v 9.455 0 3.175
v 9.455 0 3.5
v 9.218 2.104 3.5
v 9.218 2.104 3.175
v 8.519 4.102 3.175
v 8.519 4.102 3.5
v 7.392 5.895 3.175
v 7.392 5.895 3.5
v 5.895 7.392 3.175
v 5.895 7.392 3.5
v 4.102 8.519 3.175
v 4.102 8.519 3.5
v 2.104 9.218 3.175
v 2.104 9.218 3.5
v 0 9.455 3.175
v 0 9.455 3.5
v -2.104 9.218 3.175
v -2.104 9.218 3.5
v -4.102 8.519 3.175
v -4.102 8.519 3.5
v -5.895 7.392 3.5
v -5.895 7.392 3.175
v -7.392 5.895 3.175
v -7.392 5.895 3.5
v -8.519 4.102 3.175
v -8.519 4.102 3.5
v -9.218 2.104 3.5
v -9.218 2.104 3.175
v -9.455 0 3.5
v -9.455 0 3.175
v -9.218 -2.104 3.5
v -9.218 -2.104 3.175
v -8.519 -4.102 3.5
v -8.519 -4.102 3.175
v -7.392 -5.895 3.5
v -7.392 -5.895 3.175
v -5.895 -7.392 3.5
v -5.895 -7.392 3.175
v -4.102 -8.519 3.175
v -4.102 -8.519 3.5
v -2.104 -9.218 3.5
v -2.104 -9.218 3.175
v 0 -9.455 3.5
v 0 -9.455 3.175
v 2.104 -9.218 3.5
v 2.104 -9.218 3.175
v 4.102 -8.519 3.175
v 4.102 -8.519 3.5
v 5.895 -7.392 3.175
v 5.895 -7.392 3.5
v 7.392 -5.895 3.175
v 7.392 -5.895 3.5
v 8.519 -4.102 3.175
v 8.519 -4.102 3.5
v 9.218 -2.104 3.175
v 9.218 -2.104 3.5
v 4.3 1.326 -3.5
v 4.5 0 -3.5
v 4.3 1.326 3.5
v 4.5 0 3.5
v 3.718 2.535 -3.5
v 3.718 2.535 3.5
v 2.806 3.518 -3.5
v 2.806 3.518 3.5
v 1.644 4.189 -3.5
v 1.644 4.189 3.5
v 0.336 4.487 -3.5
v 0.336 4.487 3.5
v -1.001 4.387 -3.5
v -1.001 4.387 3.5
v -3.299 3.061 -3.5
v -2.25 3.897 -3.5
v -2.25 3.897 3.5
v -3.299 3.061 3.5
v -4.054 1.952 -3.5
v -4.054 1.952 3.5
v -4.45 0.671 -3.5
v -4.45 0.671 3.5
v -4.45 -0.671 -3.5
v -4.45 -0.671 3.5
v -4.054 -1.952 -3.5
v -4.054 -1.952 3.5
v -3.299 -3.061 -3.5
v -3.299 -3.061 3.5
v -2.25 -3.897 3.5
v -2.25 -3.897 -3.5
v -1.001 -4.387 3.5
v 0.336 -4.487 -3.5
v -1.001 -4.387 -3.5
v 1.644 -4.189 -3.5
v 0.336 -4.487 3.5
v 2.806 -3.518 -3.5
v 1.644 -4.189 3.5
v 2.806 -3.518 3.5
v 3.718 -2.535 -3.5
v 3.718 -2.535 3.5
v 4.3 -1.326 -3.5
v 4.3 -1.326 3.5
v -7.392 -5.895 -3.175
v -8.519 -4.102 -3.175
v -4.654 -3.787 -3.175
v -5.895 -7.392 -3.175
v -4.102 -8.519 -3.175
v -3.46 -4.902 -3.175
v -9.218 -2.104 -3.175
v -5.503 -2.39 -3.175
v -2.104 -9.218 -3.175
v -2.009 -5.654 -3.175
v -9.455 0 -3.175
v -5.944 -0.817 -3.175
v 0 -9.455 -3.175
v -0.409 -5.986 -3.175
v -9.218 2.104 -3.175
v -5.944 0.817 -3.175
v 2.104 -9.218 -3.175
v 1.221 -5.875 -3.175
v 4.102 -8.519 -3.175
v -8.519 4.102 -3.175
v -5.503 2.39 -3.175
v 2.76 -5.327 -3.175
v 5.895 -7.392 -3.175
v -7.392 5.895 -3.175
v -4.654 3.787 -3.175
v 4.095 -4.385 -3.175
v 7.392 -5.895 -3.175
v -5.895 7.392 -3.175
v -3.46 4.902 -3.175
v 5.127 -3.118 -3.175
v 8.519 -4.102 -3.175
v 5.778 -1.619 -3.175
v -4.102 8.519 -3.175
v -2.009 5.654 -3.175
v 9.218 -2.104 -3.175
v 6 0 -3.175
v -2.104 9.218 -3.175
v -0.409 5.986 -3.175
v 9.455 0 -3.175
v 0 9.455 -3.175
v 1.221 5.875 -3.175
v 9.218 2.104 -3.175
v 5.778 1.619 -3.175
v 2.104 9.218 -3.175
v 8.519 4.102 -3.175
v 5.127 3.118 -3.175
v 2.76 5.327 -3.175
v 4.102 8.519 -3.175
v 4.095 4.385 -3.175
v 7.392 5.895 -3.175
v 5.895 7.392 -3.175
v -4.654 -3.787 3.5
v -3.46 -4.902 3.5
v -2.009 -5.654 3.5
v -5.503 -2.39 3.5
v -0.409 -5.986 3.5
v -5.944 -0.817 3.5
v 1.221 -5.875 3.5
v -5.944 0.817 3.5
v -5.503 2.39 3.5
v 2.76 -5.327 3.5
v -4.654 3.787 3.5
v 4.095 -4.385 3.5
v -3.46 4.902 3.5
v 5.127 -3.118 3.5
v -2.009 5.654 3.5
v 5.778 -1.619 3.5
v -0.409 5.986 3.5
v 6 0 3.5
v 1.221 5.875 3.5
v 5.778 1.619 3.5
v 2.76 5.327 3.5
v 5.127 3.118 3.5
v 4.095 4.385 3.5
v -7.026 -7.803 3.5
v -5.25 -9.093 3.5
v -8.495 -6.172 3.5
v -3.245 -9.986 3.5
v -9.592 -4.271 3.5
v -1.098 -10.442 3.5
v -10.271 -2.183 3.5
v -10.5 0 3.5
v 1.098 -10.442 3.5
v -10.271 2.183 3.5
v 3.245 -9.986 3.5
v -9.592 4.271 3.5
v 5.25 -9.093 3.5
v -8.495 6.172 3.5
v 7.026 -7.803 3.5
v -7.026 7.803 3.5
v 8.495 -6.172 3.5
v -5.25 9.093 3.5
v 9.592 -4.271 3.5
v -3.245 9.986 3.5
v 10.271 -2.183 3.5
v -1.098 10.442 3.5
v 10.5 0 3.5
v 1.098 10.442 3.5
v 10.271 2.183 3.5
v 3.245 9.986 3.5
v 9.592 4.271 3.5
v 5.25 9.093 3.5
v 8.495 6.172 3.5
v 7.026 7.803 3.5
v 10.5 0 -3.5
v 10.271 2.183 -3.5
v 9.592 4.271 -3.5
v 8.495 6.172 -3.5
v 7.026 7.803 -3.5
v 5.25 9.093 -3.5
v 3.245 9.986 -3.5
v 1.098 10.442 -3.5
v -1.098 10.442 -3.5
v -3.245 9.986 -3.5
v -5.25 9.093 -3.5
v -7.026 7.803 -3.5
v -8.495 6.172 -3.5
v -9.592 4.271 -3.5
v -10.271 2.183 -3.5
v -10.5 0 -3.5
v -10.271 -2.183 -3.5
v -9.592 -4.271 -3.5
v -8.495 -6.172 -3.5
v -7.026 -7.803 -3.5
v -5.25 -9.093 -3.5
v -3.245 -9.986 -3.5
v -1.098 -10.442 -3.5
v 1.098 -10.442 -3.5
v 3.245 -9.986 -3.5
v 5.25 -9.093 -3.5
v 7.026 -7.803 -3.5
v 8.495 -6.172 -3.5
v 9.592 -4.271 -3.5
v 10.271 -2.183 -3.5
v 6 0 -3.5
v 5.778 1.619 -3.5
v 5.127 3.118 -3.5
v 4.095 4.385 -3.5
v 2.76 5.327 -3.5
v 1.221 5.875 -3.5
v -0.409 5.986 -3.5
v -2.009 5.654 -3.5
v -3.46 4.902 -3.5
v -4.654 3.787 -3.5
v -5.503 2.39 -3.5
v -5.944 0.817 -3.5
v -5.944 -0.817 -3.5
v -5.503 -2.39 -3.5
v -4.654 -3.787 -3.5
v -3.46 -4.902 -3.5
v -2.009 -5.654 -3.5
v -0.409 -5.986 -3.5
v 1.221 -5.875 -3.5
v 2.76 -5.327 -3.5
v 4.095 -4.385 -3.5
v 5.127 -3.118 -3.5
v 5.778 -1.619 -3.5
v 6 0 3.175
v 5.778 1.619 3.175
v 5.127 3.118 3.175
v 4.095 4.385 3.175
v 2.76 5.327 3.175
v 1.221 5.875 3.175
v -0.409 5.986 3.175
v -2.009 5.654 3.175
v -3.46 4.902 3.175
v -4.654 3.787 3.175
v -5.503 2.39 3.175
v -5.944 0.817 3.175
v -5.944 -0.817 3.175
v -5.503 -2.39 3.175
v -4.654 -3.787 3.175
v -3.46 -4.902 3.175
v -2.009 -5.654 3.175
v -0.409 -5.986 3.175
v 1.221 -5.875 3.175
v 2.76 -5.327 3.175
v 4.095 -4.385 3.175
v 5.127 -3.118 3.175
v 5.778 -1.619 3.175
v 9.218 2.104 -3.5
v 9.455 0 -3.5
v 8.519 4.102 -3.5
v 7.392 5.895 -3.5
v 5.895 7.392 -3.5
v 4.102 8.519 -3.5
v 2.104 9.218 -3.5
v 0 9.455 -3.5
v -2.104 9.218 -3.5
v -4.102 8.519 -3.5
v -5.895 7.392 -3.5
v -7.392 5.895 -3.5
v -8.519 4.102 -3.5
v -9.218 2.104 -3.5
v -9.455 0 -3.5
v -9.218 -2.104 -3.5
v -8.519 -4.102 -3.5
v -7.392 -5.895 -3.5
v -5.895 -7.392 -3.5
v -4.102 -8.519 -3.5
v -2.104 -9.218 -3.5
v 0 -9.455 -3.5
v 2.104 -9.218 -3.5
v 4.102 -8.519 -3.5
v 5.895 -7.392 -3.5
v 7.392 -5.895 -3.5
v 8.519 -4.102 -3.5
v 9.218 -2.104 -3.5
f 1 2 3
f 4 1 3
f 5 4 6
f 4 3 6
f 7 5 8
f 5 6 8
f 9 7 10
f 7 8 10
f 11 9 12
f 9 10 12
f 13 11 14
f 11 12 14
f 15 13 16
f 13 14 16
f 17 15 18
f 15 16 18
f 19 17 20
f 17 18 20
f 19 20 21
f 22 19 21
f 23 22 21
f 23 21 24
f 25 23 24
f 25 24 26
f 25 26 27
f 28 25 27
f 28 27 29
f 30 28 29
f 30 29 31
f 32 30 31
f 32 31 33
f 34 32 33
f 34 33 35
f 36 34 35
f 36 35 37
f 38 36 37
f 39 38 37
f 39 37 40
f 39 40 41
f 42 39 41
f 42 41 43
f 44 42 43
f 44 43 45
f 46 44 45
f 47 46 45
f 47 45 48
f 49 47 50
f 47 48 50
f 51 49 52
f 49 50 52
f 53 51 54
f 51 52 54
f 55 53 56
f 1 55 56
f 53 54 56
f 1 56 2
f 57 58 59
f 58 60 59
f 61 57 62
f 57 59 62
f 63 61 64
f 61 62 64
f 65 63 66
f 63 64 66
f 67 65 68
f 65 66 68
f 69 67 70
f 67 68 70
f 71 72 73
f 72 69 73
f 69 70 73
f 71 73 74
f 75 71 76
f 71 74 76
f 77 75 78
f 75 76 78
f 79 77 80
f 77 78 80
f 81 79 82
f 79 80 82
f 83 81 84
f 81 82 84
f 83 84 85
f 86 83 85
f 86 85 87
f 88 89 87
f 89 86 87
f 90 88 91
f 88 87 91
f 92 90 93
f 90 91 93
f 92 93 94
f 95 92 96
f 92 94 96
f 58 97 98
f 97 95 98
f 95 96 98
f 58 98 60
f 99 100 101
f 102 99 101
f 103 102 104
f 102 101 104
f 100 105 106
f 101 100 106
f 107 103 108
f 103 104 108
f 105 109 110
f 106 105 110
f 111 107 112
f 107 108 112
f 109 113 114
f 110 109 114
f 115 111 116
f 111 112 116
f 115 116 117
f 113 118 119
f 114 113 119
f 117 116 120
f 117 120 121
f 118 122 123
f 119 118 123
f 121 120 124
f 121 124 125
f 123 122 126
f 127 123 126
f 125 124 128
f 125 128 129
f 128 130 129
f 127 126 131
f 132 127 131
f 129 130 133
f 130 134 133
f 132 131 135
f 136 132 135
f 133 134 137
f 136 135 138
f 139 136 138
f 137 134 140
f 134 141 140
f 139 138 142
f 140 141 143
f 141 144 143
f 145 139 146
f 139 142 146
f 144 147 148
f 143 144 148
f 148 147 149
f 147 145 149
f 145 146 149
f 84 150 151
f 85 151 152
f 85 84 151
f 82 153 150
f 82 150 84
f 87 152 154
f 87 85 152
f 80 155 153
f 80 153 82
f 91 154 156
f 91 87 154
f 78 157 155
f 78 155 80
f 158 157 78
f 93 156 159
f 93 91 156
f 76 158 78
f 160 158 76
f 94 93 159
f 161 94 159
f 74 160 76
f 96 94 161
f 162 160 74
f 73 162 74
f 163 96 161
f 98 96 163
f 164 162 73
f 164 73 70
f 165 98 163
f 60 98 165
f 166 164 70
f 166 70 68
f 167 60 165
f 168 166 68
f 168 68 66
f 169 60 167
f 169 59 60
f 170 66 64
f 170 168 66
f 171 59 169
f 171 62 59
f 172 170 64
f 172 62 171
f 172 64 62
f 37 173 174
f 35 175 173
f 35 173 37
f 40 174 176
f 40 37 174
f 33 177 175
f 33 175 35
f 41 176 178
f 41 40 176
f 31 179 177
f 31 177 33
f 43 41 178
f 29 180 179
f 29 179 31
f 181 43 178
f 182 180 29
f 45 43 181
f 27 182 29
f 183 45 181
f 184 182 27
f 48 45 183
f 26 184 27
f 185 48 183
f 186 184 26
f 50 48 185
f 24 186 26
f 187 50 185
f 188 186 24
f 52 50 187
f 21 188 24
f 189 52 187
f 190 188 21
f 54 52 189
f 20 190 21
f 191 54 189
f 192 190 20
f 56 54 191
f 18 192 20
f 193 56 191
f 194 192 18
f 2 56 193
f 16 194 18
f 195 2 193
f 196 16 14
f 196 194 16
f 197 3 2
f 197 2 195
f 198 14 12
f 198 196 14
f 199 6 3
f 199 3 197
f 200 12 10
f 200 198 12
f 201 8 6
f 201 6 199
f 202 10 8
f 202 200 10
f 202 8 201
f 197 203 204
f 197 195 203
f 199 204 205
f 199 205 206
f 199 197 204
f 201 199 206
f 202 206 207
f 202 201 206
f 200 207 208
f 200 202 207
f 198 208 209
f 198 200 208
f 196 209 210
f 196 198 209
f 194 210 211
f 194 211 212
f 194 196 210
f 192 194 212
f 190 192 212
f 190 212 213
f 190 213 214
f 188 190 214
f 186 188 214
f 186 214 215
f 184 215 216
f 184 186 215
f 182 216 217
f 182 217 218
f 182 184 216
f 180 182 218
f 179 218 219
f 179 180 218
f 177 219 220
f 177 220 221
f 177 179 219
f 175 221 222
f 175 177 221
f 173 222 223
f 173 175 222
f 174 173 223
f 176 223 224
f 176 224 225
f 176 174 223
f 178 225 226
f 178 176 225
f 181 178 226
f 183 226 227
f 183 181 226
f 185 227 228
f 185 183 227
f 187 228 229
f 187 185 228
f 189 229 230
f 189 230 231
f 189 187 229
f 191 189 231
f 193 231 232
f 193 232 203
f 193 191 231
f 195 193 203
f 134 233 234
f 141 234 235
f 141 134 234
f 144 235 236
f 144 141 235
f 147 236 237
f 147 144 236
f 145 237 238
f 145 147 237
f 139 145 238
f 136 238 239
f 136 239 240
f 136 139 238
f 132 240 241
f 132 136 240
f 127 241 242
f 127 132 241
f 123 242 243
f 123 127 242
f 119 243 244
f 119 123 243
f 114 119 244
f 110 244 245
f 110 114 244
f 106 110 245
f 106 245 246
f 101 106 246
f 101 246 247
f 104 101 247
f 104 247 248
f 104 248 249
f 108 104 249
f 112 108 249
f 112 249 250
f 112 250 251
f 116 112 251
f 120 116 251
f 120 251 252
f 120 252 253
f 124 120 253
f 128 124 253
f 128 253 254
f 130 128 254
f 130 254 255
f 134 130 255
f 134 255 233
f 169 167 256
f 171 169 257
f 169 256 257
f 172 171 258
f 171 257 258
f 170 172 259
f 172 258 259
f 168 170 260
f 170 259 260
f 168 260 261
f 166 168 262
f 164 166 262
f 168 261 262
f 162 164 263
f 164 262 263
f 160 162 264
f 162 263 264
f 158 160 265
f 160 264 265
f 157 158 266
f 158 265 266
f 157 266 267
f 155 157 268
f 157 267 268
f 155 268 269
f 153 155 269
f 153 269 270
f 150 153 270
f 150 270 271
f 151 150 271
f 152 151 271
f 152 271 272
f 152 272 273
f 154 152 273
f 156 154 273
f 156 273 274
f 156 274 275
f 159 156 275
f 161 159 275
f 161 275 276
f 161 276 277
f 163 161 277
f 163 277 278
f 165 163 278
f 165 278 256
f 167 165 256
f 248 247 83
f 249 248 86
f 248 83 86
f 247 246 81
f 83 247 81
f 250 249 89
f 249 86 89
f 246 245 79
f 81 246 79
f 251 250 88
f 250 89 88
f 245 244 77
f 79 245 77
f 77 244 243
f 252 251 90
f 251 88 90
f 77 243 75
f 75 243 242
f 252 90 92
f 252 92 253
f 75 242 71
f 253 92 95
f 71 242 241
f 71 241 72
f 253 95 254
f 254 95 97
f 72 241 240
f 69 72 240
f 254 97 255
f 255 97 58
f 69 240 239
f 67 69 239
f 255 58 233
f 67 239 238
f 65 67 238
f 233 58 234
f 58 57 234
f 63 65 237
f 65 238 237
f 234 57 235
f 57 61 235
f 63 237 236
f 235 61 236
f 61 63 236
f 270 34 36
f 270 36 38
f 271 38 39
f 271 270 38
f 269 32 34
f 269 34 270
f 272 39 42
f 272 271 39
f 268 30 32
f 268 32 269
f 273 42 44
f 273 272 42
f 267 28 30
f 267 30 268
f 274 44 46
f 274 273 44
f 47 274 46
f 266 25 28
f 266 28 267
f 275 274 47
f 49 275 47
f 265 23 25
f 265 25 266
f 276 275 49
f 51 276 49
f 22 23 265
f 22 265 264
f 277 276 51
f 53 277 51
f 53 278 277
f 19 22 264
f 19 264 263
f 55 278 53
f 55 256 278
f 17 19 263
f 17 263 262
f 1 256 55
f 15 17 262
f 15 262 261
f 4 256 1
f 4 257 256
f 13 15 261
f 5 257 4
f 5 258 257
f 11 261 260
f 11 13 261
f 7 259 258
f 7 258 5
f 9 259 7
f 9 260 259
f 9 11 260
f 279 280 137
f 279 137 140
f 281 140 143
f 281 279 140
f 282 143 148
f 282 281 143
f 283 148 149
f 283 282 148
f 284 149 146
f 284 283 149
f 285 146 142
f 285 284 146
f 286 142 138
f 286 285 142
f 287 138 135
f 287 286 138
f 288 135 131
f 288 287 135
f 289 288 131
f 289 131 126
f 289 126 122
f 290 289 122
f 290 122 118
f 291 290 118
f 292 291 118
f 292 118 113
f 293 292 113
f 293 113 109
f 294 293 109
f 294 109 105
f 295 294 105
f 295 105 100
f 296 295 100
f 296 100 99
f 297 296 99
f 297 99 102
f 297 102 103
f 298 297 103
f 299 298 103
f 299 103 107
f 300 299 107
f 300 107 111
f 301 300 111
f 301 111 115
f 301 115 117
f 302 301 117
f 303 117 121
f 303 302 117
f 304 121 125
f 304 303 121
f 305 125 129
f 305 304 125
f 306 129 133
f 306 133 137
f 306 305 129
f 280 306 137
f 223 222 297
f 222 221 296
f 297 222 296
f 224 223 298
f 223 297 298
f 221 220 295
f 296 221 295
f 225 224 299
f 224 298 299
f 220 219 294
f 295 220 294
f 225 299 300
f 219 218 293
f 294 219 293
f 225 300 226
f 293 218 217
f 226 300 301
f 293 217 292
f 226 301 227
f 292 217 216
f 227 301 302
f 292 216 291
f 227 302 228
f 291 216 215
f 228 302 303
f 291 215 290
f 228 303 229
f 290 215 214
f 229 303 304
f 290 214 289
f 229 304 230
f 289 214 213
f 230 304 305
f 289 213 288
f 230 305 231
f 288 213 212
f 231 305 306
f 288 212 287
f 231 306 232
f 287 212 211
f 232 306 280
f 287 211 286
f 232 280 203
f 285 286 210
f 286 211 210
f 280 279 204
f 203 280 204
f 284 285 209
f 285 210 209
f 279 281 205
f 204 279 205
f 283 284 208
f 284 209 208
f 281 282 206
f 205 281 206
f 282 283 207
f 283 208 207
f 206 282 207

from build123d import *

# Parameters (mm, degrees)
F0_R      = 10.500004
F1_DEPTH  = 3.499993
F2_R      = 9.45496
F3_DEPTH  = 25.4
F4_R      = 9.45496
F5_DEPTH  = 3.175
F6_R      = 6.000001
F7_DEPTH  = 3.499993
F8_T      = -1.9558
F9_R      = 4.500004
F10_DEPTH = 2514.6


with BuildPart() as f1:
    # F0 (on Top) → F1 (new body)
    with BuildSketch(Plane.XY):
        Circle(F0_R)
    extrude(amount=F1_DEPTH)

    # F2 (on face) → F3 (cut)
    with BuildSketch(Plane.XY.offset(3.499993)):
        Circle(F2_R)
    extrude(amount=-F3_DEPTH, mode=Mode.SUBTRACT)

    # F4 (on Top) → F5 (join)
    with BuildSketch(Plane.XY):
        Circle(F4_R)
    extrude(amount=F5_DEPTH)

    # F6 (on Top) → F7 (join)
    with BuildSketch(Plane.XY):
        Circle(F6_R)
    extrude(amount=F7_DEPTH)

    # F8
    f8_openings = [f1.faces().sort_by_distance(p)[0] for p in [
        (0, 0, 3.499993),
    ]]
    offset(amount=F8_T, openings=f8_openings)

    # F9 (on Top) → F10 (cut)
    with BuildSketch(Plane.XY):
        Circle(F9_R)
    extrude(amount=F10_DEPTH, mode=Mode.SUBTRACT)

    # F11: F1 across plane


with BuildPart() as f1_1:
    add(f1.part)
    add(f1.part.mirror(Plane.XY))


solid = f1_1.part
